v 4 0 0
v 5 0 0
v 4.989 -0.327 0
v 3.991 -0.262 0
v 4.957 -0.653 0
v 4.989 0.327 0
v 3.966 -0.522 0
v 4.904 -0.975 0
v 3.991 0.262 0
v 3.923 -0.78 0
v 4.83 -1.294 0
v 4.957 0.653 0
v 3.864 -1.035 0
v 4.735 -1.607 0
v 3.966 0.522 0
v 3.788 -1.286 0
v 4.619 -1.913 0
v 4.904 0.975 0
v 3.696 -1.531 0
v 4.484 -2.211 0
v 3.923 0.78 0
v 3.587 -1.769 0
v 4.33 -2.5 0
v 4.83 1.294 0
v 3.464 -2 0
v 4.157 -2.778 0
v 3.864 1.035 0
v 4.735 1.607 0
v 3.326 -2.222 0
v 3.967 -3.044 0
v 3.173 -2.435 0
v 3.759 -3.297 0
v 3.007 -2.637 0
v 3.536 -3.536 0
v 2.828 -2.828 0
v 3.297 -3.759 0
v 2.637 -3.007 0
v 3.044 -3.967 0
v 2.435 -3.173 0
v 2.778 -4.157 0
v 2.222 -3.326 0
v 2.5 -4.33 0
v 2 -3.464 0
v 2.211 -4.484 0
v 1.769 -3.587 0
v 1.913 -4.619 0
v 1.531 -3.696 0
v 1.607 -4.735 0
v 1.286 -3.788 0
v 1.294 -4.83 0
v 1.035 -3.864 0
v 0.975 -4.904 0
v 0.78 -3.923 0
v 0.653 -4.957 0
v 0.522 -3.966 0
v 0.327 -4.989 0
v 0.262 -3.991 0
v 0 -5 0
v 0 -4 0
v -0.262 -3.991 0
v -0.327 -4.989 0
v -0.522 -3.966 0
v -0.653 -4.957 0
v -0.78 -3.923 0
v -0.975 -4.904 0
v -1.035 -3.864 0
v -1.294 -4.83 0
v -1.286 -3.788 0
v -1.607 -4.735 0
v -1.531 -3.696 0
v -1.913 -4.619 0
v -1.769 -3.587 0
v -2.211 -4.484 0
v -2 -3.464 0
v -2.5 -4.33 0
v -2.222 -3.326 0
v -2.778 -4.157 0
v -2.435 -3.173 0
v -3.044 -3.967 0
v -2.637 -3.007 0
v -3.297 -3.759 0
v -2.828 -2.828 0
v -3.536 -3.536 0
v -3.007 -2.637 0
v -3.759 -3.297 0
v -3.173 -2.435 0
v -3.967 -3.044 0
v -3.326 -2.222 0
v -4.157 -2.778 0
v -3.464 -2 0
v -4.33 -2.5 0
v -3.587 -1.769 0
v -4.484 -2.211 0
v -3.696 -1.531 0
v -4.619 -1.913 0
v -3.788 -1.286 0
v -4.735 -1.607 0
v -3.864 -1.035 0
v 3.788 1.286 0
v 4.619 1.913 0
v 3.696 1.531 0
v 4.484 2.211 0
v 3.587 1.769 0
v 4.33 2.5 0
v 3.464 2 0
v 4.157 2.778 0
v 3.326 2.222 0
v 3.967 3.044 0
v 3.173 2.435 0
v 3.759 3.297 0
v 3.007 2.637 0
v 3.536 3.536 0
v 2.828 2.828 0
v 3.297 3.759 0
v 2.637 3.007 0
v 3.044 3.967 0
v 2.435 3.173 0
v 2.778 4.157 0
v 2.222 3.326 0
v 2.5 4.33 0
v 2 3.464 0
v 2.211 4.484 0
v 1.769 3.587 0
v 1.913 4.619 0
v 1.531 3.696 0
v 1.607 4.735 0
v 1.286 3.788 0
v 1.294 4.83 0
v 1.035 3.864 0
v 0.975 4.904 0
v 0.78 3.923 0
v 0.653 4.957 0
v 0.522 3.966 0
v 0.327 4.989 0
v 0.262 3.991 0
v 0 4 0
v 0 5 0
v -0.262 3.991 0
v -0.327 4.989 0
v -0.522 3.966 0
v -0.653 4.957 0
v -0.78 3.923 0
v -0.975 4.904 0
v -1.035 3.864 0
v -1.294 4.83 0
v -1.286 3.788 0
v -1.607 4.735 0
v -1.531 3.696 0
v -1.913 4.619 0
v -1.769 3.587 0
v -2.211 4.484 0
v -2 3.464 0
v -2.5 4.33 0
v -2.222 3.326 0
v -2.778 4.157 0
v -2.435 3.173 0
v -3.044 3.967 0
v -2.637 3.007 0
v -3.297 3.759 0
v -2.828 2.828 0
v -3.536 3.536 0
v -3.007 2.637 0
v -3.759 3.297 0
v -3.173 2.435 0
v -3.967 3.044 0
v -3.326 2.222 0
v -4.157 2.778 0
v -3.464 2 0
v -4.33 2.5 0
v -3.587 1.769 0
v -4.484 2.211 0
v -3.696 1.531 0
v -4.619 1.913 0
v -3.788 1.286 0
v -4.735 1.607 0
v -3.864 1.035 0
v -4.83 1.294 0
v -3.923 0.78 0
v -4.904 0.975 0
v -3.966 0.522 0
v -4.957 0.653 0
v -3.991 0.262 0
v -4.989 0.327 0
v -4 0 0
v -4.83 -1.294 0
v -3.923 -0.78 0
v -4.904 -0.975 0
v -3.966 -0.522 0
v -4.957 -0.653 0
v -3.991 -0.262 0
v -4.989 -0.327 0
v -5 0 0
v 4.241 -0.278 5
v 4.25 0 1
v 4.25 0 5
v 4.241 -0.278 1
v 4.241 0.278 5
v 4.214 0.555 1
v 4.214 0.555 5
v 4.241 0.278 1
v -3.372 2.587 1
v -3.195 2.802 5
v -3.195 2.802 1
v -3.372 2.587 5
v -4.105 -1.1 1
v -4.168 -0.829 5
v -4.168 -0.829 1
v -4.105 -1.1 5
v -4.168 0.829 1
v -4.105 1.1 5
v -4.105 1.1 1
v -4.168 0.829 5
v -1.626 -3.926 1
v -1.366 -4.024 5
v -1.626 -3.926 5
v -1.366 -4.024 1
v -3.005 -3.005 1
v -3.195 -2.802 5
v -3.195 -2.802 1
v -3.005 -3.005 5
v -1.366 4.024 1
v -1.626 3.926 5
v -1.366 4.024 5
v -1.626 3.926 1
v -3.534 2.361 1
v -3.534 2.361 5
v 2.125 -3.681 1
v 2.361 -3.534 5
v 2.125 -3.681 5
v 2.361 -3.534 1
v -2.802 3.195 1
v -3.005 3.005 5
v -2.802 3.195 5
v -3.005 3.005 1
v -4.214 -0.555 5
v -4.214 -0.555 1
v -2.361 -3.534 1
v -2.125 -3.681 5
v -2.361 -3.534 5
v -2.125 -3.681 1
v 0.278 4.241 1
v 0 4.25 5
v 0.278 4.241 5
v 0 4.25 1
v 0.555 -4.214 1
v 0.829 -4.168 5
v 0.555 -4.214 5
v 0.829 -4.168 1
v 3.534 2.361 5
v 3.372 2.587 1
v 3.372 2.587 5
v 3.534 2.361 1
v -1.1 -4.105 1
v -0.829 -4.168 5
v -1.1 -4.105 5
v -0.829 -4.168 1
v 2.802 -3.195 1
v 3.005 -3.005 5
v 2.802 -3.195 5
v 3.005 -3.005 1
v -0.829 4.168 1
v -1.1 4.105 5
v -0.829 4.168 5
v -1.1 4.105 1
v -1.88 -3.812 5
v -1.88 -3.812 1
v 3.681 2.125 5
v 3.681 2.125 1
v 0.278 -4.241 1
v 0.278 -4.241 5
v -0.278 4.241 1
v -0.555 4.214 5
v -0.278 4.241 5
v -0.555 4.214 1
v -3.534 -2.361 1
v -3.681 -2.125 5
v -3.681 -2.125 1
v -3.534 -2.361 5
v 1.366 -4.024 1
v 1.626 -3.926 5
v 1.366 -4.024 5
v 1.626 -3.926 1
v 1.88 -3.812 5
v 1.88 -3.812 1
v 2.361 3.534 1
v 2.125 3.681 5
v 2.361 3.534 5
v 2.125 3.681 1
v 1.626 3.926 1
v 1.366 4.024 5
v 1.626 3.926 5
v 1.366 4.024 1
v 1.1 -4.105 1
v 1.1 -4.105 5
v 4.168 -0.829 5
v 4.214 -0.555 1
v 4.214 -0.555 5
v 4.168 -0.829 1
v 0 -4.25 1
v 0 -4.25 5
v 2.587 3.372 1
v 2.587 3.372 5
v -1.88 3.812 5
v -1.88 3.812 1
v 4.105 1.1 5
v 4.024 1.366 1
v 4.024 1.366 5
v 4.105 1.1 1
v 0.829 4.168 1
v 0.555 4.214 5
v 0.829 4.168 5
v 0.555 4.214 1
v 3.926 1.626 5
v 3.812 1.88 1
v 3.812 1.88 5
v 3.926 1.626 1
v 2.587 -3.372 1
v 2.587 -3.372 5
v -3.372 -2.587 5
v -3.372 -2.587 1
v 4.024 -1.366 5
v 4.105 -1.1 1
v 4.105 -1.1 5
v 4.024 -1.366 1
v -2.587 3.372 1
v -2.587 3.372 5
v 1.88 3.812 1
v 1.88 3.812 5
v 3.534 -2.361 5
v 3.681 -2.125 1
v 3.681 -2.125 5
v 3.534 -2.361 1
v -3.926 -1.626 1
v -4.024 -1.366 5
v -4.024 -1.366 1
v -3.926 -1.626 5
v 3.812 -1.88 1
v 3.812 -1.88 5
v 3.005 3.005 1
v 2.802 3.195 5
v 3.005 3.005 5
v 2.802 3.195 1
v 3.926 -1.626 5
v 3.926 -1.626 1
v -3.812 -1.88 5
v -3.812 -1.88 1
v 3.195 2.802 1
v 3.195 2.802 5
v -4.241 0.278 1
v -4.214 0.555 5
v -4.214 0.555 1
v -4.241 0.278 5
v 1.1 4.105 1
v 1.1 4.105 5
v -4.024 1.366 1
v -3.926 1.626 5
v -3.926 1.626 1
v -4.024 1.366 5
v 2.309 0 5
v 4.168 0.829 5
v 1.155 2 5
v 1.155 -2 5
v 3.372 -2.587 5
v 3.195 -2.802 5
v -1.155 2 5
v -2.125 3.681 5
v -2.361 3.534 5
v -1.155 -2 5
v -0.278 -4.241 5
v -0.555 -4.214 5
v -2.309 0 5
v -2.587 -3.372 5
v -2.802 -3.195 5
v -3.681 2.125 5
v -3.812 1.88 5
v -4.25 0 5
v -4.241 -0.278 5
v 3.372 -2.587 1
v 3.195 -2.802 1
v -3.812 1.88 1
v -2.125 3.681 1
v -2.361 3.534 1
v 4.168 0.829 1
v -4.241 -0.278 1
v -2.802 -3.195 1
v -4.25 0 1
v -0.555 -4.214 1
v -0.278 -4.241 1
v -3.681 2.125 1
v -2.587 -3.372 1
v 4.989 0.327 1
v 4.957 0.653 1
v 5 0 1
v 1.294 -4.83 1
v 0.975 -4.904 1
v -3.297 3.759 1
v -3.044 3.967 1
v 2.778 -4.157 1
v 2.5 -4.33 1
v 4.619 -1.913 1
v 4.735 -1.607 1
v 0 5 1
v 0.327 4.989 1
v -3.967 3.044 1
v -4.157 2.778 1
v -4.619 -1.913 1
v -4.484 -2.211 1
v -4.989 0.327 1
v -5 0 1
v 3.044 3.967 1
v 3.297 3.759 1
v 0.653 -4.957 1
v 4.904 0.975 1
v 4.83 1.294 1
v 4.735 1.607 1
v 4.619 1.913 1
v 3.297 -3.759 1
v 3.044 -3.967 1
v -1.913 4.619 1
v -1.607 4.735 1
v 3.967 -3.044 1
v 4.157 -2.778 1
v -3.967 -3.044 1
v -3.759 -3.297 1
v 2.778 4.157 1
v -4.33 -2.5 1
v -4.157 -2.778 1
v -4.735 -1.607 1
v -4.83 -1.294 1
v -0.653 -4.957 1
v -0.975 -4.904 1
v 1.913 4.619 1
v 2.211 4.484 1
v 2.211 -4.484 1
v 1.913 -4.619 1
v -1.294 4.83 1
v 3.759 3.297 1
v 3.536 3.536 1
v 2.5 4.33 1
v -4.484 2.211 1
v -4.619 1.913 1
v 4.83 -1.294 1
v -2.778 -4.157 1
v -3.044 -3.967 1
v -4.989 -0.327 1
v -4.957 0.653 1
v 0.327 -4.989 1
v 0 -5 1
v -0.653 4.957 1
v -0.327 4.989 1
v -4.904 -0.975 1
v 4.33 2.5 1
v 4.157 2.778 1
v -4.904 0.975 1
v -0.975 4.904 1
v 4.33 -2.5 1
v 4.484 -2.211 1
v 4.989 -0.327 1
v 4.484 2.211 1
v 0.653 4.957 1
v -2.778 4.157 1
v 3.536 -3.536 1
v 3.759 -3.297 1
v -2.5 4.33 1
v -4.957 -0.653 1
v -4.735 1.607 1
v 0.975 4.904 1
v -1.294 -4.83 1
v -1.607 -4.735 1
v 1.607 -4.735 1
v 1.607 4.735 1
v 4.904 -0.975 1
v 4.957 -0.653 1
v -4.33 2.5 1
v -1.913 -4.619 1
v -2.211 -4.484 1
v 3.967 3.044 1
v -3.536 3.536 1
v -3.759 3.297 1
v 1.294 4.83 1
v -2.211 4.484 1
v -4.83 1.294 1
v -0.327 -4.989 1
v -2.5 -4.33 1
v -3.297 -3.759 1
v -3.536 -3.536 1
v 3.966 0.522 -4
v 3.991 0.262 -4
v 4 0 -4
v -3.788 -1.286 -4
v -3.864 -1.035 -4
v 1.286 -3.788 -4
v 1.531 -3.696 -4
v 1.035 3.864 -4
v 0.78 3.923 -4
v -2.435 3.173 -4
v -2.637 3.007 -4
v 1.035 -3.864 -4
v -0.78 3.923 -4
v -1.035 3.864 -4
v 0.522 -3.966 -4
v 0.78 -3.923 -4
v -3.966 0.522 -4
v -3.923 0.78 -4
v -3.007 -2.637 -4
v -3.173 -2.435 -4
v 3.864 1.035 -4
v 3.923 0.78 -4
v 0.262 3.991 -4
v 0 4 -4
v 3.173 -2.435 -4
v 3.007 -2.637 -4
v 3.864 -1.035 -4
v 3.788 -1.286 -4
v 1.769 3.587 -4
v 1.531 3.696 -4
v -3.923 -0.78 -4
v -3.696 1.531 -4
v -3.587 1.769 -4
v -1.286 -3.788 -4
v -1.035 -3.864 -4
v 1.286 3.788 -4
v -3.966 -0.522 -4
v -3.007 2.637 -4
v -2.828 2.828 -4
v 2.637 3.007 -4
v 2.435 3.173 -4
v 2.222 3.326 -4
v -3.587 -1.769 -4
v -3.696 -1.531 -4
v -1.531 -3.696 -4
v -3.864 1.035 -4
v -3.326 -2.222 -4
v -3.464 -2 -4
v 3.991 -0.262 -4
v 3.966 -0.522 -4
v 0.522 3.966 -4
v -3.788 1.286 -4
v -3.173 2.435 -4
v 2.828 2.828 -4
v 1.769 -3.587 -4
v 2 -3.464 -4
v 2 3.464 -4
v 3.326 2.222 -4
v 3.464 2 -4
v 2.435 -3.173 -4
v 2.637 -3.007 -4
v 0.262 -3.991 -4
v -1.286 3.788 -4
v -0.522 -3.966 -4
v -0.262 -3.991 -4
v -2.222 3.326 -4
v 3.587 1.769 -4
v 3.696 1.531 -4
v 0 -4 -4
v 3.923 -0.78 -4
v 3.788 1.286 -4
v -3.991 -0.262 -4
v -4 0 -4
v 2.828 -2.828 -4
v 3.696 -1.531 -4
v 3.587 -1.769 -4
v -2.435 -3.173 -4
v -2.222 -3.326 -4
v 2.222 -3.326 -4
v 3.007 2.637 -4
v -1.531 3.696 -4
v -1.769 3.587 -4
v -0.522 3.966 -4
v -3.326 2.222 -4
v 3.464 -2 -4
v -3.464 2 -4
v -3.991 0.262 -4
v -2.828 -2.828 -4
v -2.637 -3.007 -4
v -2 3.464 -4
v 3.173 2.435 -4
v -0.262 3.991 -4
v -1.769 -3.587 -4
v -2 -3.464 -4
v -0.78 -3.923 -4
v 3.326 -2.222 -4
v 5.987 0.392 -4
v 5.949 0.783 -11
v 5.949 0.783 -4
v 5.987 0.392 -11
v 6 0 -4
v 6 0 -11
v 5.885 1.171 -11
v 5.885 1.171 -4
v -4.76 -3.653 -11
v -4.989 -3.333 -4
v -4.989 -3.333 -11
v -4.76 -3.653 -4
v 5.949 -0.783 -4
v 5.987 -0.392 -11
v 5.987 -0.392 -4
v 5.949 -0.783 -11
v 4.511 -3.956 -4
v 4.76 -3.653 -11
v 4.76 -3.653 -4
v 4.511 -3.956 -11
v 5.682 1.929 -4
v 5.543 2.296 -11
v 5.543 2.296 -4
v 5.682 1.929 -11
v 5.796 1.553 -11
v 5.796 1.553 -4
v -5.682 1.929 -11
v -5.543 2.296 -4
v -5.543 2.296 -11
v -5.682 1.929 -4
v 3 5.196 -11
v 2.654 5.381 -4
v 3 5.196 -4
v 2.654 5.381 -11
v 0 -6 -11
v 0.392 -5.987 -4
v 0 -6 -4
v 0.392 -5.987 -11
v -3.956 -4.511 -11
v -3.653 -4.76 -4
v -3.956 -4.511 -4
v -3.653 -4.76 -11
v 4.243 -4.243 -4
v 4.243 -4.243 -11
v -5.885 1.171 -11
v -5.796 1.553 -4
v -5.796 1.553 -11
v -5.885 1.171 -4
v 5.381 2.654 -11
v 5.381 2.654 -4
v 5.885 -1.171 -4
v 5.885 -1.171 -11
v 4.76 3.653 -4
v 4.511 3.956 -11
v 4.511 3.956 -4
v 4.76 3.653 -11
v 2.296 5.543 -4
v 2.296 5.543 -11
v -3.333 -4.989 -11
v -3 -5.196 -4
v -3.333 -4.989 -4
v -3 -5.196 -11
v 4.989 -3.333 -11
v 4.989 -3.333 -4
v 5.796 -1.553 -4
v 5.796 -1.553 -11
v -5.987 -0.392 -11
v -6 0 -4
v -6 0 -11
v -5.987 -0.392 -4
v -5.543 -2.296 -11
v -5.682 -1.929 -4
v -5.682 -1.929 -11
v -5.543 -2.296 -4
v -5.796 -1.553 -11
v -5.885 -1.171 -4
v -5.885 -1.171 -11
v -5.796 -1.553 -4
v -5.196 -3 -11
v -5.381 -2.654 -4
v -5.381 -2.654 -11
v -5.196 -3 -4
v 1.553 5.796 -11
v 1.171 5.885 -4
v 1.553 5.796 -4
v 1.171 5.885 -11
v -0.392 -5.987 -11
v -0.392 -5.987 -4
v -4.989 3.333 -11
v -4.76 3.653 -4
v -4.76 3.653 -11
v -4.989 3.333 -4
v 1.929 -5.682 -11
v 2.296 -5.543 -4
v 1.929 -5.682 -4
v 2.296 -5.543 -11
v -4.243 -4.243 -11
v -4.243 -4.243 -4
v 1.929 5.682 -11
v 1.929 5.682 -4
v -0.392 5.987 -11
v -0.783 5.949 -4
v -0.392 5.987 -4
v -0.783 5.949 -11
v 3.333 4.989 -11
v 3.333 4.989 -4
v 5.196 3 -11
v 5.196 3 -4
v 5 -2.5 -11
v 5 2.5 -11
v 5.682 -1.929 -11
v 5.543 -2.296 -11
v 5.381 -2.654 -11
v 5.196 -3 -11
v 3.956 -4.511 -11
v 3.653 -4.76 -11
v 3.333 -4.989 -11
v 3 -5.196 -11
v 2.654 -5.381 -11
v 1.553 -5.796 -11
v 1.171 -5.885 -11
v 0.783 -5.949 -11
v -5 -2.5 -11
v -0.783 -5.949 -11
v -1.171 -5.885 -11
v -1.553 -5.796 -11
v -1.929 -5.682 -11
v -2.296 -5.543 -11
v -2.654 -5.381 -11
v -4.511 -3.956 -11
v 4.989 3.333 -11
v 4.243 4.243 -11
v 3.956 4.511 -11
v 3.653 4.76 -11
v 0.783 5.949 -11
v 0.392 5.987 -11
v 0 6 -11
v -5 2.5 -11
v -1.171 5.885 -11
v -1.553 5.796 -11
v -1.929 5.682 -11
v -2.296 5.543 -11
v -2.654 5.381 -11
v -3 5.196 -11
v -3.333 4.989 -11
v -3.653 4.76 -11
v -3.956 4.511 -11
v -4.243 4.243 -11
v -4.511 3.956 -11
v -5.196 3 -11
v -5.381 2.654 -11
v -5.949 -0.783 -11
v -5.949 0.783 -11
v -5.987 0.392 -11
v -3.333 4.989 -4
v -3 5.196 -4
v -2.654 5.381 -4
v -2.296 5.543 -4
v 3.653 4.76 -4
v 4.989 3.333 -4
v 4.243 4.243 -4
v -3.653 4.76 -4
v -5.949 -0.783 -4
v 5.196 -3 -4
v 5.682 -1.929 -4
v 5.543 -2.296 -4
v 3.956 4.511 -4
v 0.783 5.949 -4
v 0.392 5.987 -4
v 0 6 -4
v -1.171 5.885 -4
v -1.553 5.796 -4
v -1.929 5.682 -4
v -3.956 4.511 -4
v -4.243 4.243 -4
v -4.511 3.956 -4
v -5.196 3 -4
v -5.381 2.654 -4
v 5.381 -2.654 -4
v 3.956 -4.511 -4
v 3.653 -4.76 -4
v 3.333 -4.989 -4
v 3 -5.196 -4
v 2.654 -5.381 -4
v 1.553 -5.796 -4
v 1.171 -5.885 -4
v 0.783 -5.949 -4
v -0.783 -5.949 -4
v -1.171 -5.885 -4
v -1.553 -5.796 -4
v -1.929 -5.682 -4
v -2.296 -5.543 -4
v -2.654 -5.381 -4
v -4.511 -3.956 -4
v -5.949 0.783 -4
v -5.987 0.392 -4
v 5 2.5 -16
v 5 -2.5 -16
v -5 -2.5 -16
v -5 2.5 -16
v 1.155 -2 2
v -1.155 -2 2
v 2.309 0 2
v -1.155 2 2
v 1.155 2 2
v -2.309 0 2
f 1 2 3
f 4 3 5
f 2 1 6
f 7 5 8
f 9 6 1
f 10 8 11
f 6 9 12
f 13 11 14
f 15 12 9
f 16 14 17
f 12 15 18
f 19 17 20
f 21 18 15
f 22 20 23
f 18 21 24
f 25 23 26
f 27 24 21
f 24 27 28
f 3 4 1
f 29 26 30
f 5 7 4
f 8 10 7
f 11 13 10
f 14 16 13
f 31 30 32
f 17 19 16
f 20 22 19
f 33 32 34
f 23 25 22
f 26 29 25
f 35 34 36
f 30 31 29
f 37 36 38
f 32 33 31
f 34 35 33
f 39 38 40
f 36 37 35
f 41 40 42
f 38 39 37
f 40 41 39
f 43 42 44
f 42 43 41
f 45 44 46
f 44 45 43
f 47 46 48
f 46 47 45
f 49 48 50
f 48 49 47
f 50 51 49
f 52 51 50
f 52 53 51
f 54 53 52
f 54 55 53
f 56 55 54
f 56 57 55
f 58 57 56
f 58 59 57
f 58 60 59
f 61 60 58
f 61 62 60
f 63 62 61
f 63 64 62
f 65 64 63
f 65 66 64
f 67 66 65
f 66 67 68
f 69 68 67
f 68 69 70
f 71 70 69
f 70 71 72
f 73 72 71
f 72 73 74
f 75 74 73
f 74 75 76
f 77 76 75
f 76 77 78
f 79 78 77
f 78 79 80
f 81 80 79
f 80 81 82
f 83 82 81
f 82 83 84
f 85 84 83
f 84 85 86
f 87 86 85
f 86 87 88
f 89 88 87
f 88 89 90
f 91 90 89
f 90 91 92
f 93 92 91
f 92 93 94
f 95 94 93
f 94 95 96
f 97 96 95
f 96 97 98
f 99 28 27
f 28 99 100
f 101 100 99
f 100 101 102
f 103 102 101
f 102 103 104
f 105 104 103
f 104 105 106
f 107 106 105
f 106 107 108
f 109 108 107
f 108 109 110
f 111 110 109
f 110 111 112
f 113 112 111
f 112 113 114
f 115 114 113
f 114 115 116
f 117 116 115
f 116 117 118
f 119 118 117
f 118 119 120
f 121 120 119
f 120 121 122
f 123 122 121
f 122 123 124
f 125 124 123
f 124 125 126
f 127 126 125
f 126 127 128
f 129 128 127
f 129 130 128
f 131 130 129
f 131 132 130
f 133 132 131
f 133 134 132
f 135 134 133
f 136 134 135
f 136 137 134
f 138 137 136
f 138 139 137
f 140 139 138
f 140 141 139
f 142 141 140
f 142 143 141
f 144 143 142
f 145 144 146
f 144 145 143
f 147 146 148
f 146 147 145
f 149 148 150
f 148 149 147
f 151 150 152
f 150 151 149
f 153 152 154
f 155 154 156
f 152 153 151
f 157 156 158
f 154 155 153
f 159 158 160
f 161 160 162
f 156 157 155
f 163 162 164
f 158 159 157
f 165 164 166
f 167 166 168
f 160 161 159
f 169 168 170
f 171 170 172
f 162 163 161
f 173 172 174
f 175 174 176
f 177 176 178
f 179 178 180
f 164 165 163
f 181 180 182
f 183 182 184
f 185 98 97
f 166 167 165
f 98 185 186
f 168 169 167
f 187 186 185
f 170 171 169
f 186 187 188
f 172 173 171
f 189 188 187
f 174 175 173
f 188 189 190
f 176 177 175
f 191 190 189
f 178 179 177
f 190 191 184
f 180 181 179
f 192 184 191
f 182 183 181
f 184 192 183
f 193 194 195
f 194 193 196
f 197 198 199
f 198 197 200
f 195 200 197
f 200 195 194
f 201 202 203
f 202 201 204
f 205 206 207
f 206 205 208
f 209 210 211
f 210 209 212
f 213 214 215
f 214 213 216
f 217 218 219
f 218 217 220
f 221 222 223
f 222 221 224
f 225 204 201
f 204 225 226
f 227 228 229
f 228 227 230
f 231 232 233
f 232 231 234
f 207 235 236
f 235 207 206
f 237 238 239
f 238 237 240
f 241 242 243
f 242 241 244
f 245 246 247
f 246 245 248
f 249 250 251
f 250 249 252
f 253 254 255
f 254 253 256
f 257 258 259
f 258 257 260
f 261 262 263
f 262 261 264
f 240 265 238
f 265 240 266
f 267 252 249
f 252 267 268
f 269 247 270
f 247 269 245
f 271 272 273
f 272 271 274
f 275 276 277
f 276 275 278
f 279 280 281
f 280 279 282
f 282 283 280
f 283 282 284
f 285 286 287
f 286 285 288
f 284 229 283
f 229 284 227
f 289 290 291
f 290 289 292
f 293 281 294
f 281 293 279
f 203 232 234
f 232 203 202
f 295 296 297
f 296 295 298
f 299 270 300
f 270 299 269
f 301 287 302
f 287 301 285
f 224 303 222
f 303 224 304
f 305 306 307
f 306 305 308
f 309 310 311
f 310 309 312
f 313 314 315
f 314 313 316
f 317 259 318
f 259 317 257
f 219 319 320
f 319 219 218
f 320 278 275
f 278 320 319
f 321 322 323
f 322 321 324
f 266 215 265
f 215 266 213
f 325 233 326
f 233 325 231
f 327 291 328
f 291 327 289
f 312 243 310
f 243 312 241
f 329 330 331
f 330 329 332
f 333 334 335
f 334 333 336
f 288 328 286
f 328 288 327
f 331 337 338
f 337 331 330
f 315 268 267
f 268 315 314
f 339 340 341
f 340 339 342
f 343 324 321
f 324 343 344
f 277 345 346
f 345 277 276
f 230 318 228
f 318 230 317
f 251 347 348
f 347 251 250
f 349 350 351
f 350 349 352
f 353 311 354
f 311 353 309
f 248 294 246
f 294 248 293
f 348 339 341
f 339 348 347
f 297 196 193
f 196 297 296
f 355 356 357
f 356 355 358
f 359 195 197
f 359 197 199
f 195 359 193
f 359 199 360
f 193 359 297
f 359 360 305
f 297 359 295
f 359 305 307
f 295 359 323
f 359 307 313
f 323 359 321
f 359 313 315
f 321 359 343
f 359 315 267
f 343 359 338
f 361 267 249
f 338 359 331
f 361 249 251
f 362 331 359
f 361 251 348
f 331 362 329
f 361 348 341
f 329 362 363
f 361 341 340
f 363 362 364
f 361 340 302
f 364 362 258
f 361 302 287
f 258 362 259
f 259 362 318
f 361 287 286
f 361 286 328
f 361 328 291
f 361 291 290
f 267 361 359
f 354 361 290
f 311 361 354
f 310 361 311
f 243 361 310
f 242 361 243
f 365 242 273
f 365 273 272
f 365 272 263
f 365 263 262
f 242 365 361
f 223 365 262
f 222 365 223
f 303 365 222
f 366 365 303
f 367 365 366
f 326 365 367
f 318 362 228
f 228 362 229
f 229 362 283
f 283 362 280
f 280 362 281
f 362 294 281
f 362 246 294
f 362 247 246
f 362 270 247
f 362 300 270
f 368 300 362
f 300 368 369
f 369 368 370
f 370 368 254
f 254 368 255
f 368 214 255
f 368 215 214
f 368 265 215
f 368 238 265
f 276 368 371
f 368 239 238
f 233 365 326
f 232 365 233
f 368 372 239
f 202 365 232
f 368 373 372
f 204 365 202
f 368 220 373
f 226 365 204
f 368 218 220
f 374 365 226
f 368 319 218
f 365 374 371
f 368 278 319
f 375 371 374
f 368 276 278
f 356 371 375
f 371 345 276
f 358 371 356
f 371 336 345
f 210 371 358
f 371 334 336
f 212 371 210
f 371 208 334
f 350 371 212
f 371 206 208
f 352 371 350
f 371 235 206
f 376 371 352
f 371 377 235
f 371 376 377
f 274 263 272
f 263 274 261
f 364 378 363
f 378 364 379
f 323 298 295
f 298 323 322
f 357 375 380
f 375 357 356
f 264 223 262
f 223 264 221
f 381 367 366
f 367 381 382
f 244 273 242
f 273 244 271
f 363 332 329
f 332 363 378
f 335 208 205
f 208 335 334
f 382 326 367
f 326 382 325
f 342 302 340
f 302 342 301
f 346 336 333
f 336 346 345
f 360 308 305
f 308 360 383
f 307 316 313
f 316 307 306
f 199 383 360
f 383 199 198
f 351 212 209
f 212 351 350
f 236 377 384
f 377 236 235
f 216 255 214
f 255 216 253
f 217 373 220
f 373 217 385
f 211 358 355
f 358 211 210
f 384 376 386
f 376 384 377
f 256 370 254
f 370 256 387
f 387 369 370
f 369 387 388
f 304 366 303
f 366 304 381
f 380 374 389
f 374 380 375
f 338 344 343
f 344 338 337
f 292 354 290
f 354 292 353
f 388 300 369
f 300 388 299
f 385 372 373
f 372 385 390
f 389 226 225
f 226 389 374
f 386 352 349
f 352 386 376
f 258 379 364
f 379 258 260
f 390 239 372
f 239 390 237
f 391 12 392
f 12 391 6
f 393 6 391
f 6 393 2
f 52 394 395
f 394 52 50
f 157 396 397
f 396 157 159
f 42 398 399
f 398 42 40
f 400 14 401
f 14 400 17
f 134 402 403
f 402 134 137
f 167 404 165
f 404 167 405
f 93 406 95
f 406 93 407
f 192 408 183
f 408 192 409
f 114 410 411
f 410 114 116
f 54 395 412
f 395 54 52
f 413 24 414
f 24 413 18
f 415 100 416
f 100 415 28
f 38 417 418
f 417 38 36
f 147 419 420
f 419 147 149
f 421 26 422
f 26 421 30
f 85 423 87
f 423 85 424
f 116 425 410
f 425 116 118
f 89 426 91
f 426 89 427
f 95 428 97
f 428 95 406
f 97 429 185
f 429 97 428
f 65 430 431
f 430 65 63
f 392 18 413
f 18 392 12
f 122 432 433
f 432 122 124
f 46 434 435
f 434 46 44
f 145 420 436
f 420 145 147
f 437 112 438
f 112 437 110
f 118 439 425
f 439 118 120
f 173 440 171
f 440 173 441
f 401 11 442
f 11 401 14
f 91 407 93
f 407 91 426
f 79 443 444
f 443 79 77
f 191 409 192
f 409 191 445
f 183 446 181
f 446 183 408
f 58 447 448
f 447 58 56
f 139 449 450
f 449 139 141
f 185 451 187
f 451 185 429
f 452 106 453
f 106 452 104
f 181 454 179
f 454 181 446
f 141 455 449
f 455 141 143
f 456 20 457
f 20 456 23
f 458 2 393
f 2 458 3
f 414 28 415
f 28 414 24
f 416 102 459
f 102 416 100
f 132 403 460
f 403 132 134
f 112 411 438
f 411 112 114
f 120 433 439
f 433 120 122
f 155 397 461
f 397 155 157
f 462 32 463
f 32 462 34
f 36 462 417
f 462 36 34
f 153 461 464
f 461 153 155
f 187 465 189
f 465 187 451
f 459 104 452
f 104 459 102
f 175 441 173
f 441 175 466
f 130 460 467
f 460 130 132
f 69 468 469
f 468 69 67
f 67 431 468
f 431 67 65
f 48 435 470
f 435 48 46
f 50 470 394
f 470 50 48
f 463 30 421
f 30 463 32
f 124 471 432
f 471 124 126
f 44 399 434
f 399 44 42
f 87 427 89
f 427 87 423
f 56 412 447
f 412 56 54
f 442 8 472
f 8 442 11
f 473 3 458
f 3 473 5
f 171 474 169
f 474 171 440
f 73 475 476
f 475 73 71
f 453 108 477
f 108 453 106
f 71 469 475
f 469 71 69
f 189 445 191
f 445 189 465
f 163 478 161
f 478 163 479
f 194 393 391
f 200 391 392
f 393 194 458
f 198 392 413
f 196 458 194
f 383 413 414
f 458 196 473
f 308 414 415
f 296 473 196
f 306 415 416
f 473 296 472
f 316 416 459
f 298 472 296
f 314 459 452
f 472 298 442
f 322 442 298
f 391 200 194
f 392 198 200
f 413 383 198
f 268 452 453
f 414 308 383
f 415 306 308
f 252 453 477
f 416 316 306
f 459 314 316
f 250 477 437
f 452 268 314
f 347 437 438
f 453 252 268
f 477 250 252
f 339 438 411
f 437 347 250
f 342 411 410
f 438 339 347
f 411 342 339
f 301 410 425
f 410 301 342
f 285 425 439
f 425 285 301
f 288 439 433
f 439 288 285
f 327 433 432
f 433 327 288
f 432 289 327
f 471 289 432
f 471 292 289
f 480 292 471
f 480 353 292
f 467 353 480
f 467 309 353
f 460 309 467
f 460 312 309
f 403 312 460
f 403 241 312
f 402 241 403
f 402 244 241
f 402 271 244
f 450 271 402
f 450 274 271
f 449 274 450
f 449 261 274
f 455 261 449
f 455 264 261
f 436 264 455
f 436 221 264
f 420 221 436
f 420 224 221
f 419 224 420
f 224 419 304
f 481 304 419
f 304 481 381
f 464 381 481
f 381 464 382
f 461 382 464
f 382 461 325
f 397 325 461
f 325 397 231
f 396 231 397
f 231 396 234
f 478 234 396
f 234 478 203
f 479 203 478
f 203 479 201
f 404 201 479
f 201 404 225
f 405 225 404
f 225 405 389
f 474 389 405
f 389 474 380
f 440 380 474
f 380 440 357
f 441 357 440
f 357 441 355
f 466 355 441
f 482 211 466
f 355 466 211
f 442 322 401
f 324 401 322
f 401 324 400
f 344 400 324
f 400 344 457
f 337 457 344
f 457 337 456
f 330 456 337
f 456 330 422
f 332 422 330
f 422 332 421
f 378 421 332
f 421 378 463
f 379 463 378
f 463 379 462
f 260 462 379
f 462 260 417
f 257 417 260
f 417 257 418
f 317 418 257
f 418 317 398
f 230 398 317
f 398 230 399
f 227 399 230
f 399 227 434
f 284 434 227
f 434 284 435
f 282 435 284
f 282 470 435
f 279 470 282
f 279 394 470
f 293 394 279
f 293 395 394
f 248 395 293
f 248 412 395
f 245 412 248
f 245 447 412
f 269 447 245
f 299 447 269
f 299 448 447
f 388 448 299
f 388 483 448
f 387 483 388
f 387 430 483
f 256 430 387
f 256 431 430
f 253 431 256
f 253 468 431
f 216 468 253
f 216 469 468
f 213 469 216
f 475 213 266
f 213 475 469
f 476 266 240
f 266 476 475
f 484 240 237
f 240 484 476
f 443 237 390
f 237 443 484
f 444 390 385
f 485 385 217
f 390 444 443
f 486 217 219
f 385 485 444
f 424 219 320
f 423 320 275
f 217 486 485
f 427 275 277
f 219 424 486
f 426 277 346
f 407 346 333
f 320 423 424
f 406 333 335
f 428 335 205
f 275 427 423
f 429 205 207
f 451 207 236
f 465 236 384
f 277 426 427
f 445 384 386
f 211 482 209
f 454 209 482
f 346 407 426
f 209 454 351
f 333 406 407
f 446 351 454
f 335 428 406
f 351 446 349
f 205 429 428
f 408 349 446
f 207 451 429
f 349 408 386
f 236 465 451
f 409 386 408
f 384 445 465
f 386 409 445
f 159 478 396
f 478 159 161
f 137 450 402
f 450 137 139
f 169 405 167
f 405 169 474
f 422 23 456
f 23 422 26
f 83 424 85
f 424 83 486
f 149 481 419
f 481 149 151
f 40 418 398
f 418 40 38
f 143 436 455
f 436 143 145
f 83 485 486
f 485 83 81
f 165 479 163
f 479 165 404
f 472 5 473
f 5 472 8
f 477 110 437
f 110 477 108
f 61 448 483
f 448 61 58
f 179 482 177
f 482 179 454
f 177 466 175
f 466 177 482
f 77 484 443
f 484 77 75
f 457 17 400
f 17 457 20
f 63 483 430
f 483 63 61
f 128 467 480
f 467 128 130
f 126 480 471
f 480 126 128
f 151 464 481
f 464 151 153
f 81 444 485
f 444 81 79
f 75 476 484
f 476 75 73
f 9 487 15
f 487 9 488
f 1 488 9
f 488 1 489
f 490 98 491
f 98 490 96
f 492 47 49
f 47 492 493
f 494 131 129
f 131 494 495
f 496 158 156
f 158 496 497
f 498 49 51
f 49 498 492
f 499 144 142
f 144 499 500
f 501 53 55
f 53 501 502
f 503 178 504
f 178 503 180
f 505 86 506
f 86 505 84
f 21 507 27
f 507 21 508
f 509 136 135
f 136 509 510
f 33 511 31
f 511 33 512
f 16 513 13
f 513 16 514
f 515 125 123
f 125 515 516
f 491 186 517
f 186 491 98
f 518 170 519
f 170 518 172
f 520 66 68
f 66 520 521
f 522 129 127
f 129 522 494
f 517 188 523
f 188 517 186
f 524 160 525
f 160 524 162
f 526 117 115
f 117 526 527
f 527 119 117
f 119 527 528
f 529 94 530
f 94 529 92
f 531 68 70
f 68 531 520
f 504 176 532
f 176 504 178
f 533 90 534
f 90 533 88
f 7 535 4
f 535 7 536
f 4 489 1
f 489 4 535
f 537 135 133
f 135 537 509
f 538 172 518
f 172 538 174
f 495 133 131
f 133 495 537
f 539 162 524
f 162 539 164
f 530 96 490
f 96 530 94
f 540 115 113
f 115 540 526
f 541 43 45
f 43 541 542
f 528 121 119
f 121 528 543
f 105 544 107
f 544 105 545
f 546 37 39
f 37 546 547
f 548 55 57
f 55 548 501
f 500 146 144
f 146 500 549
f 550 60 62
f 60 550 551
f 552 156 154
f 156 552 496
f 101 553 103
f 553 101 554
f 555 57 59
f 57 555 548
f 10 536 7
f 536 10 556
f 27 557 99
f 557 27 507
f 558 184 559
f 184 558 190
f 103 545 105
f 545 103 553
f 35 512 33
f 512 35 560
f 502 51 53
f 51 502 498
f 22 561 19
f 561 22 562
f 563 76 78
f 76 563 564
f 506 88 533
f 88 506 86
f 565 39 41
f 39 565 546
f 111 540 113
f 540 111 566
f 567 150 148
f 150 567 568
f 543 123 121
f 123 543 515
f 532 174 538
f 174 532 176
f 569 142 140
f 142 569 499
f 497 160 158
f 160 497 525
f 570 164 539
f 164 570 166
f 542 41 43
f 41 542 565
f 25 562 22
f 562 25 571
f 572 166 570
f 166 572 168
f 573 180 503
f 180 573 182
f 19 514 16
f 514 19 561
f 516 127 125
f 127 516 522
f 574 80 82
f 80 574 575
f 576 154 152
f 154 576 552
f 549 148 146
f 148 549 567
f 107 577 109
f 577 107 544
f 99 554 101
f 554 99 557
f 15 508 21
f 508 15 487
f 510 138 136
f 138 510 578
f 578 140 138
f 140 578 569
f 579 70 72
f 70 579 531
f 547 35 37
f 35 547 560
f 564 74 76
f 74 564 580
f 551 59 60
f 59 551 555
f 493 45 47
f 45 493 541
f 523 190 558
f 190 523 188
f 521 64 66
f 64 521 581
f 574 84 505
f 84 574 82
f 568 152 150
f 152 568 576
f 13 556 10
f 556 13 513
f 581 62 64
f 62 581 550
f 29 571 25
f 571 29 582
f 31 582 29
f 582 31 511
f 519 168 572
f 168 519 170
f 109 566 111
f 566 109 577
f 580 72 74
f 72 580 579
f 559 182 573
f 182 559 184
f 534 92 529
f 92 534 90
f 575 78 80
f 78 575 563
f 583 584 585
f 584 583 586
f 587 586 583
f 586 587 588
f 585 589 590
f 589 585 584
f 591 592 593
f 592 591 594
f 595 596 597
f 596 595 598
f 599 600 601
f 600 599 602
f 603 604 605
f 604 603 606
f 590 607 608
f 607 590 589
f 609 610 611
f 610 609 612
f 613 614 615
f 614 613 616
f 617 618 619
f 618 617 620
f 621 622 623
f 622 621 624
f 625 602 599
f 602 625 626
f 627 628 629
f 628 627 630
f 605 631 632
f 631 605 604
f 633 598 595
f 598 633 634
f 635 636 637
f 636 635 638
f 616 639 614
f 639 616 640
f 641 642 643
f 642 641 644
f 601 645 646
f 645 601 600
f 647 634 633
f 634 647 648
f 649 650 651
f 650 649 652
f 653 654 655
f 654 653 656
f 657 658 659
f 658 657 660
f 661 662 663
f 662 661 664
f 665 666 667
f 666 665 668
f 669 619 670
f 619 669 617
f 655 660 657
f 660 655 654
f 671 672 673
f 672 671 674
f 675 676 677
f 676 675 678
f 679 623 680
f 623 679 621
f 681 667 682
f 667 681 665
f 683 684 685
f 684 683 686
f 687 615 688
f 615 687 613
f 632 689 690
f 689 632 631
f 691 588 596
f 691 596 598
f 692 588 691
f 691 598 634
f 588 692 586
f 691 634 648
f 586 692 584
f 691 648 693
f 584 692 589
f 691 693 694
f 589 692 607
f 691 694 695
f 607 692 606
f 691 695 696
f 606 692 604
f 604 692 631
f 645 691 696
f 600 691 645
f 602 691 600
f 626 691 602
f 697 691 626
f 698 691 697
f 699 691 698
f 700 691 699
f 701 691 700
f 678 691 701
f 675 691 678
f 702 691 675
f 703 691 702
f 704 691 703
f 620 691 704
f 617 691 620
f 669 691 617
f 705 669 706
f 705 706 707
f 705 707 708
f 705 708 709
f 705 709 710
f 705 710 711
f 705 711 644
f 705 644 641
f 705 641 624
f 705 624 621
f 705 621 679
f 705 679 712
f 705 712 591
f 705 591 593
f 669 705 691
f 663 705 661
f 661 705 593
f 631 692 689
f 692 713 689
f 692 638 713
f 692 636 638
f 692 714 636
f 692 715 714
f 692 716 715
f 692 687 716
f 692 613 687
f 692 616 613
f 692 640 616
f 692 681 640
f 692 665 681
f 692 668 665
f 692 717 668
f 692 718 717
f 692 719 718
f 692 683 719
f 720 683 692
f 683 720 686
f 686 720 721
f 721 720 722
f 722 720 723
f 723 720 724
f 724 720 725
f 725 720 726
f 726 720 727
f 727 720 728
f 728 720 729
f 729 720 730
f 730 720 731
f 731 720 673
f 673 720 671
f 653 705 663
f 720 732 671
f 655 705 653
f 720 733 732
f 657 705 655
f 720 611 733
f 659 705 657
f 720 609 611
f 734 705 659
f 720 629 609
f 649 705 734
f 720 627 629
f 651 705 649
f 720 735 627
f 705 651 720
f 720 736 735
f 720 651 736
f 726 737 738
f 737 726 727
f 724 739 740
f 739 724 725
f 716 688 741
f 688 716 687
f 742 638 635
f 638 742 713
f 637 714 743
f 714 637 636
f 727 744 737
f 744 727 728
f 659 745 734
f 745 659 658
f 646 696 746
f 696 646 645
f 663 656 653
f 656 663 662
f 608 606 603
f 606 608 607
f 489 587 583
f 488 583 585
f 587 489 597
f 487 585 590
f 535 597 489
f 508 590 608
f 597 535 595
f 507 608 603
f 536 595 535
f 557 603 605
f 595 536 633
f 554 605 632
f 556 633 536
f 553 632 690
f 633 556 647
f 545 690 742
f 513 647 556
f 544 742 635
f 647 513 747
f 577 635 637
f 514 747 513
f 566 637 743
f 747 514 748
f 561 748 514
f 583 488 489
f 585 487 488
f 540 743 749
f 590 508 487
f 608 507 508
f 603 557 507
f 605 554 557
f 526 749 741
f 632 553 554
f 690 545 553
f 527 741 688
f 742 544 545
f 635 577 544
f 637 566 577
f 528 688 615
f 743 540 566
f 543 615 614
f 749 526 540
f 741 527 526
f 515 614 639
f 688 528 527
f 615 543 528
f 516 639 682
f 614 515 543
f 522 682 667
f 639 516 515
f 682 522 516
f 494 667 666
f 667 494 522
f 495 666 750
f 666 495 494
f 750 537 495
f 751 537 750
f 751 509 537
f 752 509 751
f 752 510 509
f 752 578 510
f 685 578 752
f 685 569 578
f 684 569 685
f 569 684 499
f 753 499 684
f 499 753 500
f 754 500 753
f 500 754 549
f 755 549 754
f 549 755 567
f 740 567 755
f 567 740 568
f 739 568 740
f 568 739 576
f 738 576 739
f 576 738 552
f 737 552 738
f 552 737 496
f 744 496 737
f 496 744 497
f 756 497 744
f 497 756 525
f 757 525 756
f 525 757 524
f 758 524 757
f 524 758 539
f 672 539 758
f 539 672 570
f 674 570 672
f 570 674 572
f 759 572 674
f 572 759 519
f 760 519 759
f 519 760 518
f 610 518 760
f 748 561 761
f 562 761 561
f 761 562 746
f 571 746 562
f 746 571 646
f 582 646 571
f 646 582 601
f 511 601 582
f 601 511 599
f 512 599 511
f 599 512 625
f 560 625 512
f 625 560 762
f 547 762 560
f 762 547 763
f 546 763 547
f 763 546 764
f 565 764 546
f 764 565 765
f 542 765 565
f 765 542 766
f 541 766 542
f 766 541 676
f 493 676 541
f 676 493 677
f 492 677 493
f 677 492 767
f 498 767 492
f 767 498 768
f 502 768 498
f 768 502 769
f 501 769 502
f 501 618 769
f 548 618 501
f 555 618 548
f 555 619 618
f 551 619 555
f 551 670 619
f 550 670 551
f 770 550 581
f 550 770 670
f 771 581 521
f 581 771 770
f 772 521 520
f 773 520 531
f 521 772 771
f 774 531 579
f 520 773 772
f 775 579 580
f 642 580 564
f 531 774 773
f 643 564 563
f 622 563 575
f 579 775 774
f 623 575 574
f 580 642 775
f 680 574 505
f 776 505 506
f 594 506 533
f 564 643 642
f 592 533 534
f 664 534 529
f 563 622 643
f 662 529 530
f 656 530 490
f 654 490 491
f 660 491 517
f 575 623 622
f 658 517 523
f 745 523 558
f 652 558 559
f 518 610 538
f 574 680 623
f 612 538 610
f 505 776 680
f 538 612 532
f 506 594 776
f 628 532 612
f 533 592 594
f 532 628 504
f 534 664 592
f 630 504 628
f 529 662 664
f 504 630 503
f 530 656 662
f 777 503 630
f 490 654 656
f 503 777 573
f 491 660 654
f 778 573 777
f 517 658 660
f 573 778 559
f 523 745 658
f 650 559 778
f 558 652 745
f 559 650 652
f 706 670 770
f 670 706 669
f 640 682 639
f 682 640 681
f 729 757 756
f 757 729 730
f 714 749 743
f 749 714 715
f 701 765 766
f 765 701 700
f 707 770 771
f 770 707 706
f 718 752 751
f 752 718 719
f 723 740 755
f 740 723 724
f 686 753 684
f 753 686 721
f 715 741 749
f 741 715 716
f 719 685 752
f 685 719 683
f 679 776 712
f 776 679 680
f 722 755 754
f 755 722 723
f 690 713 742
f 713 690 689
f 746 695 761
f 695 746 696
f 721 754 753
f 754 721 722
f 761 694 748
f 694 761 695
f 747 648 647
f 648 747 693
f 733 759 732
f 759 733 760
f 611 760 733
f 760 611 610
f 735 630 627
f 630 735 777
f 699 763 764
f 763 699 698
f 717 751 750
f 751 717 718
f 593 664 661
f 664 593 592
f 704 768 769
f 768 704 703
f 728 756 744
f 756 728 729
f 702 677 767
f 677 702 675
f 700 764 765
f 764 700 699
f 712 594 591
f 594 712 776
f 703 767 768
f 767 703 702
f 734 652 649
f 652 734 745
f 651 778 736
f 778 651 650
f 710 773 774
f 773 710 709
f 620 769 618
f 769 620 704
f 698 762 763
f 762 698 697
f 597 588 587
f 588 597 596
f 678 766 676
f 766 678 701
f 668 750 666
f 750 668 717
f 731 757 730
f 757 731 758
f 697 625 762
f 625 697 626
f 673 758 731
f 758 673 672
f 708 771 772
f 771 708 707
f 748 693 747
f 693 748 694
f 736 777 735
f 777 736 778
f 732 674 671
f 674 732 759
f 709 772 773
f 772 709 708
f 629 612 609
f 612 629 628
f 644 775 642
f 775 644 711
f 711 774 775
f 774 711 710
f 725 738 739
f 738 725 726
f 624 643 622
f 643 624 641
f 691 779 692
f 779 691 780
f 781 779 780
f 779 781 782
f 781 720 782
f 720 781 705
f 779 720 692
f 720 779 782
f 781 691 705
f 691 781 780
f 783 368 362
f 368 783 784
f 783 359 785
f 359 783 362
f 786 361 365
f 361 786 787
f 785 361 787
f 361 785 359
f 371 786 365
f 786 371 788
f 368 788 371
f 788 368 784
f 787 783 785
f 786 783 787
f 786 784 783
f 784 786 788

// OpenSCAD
// Parameters
shank_diameter_mm = 5; //[2.5:10:0.1]
length_under_head_mm = 10; //[5:20:0.5]
head_diameter_mm = 8.5; //[6:17:0.1]
head_height_mm = 5; //[2.5:10:0.1]
thread_pitch_mm = 0.8; //[0.4:1.6:0.05]
thread_coverage_ratio = 1; //[0.3:1:0.05]
thread_major_diameter_mm = 5; //[2.5:10:0.1]
thread_minor_diameter_mm = 4.2; //[2:9:0.1]
hex_socket_af_mm = 4; //[2:8:0.1]
hex_socket_depth_mm = 3; //[1.5:5:0.1]
overlap_mm = 1; //[0.5:2:0.1]
washer_outer_diameter_mm = 10; //[6:20:0.1]
washer_thickness_mm = 1; //[0.5:3:0.1]
washer_hole_diameter_mm = 5.5; //[3:11:0.1]
pcb_spacer_outer_diameter_mm = 8; //[4:16:0.1]
pcb_spacer_height_mm = 6; //[3:12:0.1]
buzzer_diameter_mm = 12; //[6:24:0.1]
buzzer_height_mm = 7; //[3:14:0.1]
pin_socket_length_mm = 10; //[5:20:0.5]
pin_socket_width_mm = 5; //[2.5:10:0.1]
pin_socket_height_mm = 6; //[3:12:0.1]
connector_radius_mm = 0.6; //[0.3:1.5:0.1]

$fn = 96;

// --- Z reference ---
// Underside of screw head at z=0.
// Head: [0 .. head_height_mm]
// Shank: [-length_under_head_mm .. 0]
z_head_bottom = 0;
z_head_top    = head_height_mm;

z_shank_top    = z_head_bottom;
z_shank_bottom = z_head_bottom - length_under_head_mm;

// Build a fully connected stack UNDER the head with intentional overlaps.
// Washer must touch/overlap head underside and shank.
z_washer_top    = z_shank_top + overlap_mm;                 // overlaps into head underside region
z_washer_bottom = z_washer_top - washer_thickness_mm;

// Spacer overlaps into washer
z_spacer_top    = z_washer_bottom + overlap_mm;
z_spacer_bottom = z_spacer_top - pcb_spacer_height_mm;

// Buzzer overlaps into spacer
z_buzzer_top    = z_spacer_bottom + overlap_mm;
z_buzzer_bottom = z_buzzer_top - buzzer_height_mm;

// Pin socket overlaps into buzzer
z_pin_top       = z_buzzer_bottom + overlap_mm;
z_pin_bottom    = z_pin_top - pin_socket_height_mm;

// Connector rod spans from inside head down through the stack with overlap at both ends
z_rod_top    = z_head_top - overlap_mm;
z_rod_bottom = z_pin_bottom + overlap_mm;

// Pin Socket - Detailed Geometry
module pin_socket() {
  color([0.85, 0.85, 0.8])
    translate([0, 0, (z_pin_top + z_pin_bottom)/2])
      cube([pin_socket_length_mm, pin_socket_width_mm, pin_socket_height_mm], center=true);
}

// Hex socket recess (subtracted from head)
module hex_socket_cut() {
  // Place recess from head top downward; extend slightly above top for clean cut
  z_cut_top = z_head_top + overlap_mm;
  z_cut_bottom = z_head_top - hex_socket_depth_mm;
  translate([0, 0, (z_cut_top + z_cut_bottom)/2])
    cylinder(r=hex_socket_af_mm/(2*cos(30)), h=(z_cut_top - z_cut_bottom), center=true, $fn=6);
}

// Screw + Washer as one connected solid
module screw_and_washer() {
  union() {
    // Screw (solid)
    color("DimGray")
    union() {
      // Shank (under head)
      translate([0, 0, (z_shank_top + z_shank_bottom)/2])
        cylinder(r=shank_diameter_mm/2, h=length_under_head_mm, center=true);

      // Cap head (overlaps into washer via washer placement)
      translate([0, 0, (z_head_top + z_head_bottom)/2])
        cylinder(r=head_diameter_mm/2, h=head_height_mm, center=true);

      // Threaded section (kept as a cylinder) - ensure it overlaps shank by overlap_mm
      thread_h = length_under_head_mm * thread_coverage_ratio;
      translate([0, 0, z_shank_bottom + thread_h/2 + overlap_mm])
        cylinder(r=thread_major_diameter_mm/2, h=thread_h, center=true);
    }

    // Washer (solid ring) - overlaps into head underside and shank
    color("Silver")
    difference() {
      translate([0, 0, (z_washer_top + z_washer_bottom)/2])
        cylinder(r=washer_outer_diameter_mm/2, h=washer_thickness_mm, center=true);
      translate([0, 0, (z_washer_top + z_washer_bottom)/2])
        cylinder(r=washer_hole_diameter_mm/2, h=washer_thickness_mm + 2*overlap_mm, center=true);
    }
  }
}

// PCB Spacer - overlaps into washer and buzzer
module pcb_spacer() {
  color([0.0, 0.4, 0.2])
    translate([0, 0, (z_spacer_top + z_spacer_bottom)/2])
      cylinder(r=pcb_spacer_outer_diameter_mm/2, h=pcb_spacer_height_mm, center=true);
}

// Buzzer - overlaps into spacer and pin socket
module buzzer() {
  color([0.1, 0.1, 0.6])
    translate([0, 0, (z_buzzer_top + z_buzzer_bottom)/2])
      cylinder(r=buzzer_diameter_mm/2, h=buzzer_height_mm, center=true);
}

// Connector Rod - overlaps into head and into pin socket
module connector_rod() {
  color([0.2, 0.2, 0.2])
    translate([0, 0, (z_rod_top + z_rod_bottom)/2])
      cylinder(r=connector_radius_mm, h=(z_rod_top - z_rod_bottom), center=true);
}

// Assembly: everything unioned into one connected solid; hex socket is a cut
module assembly() {
  difference() {
    union() {
      // Missing part "screw" is explicitly present here as screw_and_washer()
      screw_and_washer();  // head + shank + thread + washer (all connected via overlaps)
      pcb_spacer();        // green shank section attached (overlap)
      buzzer();            // blue mid-body cylinder attached (overlap)
      pin_socket();        // light-gray lower section attached (overlap)
      connector_rod();     // internal rod ensures continuous physical connection through stack
    }
    // Cut the hex socket into the head
    hex_socket_cut();
  }
}

assembly();
